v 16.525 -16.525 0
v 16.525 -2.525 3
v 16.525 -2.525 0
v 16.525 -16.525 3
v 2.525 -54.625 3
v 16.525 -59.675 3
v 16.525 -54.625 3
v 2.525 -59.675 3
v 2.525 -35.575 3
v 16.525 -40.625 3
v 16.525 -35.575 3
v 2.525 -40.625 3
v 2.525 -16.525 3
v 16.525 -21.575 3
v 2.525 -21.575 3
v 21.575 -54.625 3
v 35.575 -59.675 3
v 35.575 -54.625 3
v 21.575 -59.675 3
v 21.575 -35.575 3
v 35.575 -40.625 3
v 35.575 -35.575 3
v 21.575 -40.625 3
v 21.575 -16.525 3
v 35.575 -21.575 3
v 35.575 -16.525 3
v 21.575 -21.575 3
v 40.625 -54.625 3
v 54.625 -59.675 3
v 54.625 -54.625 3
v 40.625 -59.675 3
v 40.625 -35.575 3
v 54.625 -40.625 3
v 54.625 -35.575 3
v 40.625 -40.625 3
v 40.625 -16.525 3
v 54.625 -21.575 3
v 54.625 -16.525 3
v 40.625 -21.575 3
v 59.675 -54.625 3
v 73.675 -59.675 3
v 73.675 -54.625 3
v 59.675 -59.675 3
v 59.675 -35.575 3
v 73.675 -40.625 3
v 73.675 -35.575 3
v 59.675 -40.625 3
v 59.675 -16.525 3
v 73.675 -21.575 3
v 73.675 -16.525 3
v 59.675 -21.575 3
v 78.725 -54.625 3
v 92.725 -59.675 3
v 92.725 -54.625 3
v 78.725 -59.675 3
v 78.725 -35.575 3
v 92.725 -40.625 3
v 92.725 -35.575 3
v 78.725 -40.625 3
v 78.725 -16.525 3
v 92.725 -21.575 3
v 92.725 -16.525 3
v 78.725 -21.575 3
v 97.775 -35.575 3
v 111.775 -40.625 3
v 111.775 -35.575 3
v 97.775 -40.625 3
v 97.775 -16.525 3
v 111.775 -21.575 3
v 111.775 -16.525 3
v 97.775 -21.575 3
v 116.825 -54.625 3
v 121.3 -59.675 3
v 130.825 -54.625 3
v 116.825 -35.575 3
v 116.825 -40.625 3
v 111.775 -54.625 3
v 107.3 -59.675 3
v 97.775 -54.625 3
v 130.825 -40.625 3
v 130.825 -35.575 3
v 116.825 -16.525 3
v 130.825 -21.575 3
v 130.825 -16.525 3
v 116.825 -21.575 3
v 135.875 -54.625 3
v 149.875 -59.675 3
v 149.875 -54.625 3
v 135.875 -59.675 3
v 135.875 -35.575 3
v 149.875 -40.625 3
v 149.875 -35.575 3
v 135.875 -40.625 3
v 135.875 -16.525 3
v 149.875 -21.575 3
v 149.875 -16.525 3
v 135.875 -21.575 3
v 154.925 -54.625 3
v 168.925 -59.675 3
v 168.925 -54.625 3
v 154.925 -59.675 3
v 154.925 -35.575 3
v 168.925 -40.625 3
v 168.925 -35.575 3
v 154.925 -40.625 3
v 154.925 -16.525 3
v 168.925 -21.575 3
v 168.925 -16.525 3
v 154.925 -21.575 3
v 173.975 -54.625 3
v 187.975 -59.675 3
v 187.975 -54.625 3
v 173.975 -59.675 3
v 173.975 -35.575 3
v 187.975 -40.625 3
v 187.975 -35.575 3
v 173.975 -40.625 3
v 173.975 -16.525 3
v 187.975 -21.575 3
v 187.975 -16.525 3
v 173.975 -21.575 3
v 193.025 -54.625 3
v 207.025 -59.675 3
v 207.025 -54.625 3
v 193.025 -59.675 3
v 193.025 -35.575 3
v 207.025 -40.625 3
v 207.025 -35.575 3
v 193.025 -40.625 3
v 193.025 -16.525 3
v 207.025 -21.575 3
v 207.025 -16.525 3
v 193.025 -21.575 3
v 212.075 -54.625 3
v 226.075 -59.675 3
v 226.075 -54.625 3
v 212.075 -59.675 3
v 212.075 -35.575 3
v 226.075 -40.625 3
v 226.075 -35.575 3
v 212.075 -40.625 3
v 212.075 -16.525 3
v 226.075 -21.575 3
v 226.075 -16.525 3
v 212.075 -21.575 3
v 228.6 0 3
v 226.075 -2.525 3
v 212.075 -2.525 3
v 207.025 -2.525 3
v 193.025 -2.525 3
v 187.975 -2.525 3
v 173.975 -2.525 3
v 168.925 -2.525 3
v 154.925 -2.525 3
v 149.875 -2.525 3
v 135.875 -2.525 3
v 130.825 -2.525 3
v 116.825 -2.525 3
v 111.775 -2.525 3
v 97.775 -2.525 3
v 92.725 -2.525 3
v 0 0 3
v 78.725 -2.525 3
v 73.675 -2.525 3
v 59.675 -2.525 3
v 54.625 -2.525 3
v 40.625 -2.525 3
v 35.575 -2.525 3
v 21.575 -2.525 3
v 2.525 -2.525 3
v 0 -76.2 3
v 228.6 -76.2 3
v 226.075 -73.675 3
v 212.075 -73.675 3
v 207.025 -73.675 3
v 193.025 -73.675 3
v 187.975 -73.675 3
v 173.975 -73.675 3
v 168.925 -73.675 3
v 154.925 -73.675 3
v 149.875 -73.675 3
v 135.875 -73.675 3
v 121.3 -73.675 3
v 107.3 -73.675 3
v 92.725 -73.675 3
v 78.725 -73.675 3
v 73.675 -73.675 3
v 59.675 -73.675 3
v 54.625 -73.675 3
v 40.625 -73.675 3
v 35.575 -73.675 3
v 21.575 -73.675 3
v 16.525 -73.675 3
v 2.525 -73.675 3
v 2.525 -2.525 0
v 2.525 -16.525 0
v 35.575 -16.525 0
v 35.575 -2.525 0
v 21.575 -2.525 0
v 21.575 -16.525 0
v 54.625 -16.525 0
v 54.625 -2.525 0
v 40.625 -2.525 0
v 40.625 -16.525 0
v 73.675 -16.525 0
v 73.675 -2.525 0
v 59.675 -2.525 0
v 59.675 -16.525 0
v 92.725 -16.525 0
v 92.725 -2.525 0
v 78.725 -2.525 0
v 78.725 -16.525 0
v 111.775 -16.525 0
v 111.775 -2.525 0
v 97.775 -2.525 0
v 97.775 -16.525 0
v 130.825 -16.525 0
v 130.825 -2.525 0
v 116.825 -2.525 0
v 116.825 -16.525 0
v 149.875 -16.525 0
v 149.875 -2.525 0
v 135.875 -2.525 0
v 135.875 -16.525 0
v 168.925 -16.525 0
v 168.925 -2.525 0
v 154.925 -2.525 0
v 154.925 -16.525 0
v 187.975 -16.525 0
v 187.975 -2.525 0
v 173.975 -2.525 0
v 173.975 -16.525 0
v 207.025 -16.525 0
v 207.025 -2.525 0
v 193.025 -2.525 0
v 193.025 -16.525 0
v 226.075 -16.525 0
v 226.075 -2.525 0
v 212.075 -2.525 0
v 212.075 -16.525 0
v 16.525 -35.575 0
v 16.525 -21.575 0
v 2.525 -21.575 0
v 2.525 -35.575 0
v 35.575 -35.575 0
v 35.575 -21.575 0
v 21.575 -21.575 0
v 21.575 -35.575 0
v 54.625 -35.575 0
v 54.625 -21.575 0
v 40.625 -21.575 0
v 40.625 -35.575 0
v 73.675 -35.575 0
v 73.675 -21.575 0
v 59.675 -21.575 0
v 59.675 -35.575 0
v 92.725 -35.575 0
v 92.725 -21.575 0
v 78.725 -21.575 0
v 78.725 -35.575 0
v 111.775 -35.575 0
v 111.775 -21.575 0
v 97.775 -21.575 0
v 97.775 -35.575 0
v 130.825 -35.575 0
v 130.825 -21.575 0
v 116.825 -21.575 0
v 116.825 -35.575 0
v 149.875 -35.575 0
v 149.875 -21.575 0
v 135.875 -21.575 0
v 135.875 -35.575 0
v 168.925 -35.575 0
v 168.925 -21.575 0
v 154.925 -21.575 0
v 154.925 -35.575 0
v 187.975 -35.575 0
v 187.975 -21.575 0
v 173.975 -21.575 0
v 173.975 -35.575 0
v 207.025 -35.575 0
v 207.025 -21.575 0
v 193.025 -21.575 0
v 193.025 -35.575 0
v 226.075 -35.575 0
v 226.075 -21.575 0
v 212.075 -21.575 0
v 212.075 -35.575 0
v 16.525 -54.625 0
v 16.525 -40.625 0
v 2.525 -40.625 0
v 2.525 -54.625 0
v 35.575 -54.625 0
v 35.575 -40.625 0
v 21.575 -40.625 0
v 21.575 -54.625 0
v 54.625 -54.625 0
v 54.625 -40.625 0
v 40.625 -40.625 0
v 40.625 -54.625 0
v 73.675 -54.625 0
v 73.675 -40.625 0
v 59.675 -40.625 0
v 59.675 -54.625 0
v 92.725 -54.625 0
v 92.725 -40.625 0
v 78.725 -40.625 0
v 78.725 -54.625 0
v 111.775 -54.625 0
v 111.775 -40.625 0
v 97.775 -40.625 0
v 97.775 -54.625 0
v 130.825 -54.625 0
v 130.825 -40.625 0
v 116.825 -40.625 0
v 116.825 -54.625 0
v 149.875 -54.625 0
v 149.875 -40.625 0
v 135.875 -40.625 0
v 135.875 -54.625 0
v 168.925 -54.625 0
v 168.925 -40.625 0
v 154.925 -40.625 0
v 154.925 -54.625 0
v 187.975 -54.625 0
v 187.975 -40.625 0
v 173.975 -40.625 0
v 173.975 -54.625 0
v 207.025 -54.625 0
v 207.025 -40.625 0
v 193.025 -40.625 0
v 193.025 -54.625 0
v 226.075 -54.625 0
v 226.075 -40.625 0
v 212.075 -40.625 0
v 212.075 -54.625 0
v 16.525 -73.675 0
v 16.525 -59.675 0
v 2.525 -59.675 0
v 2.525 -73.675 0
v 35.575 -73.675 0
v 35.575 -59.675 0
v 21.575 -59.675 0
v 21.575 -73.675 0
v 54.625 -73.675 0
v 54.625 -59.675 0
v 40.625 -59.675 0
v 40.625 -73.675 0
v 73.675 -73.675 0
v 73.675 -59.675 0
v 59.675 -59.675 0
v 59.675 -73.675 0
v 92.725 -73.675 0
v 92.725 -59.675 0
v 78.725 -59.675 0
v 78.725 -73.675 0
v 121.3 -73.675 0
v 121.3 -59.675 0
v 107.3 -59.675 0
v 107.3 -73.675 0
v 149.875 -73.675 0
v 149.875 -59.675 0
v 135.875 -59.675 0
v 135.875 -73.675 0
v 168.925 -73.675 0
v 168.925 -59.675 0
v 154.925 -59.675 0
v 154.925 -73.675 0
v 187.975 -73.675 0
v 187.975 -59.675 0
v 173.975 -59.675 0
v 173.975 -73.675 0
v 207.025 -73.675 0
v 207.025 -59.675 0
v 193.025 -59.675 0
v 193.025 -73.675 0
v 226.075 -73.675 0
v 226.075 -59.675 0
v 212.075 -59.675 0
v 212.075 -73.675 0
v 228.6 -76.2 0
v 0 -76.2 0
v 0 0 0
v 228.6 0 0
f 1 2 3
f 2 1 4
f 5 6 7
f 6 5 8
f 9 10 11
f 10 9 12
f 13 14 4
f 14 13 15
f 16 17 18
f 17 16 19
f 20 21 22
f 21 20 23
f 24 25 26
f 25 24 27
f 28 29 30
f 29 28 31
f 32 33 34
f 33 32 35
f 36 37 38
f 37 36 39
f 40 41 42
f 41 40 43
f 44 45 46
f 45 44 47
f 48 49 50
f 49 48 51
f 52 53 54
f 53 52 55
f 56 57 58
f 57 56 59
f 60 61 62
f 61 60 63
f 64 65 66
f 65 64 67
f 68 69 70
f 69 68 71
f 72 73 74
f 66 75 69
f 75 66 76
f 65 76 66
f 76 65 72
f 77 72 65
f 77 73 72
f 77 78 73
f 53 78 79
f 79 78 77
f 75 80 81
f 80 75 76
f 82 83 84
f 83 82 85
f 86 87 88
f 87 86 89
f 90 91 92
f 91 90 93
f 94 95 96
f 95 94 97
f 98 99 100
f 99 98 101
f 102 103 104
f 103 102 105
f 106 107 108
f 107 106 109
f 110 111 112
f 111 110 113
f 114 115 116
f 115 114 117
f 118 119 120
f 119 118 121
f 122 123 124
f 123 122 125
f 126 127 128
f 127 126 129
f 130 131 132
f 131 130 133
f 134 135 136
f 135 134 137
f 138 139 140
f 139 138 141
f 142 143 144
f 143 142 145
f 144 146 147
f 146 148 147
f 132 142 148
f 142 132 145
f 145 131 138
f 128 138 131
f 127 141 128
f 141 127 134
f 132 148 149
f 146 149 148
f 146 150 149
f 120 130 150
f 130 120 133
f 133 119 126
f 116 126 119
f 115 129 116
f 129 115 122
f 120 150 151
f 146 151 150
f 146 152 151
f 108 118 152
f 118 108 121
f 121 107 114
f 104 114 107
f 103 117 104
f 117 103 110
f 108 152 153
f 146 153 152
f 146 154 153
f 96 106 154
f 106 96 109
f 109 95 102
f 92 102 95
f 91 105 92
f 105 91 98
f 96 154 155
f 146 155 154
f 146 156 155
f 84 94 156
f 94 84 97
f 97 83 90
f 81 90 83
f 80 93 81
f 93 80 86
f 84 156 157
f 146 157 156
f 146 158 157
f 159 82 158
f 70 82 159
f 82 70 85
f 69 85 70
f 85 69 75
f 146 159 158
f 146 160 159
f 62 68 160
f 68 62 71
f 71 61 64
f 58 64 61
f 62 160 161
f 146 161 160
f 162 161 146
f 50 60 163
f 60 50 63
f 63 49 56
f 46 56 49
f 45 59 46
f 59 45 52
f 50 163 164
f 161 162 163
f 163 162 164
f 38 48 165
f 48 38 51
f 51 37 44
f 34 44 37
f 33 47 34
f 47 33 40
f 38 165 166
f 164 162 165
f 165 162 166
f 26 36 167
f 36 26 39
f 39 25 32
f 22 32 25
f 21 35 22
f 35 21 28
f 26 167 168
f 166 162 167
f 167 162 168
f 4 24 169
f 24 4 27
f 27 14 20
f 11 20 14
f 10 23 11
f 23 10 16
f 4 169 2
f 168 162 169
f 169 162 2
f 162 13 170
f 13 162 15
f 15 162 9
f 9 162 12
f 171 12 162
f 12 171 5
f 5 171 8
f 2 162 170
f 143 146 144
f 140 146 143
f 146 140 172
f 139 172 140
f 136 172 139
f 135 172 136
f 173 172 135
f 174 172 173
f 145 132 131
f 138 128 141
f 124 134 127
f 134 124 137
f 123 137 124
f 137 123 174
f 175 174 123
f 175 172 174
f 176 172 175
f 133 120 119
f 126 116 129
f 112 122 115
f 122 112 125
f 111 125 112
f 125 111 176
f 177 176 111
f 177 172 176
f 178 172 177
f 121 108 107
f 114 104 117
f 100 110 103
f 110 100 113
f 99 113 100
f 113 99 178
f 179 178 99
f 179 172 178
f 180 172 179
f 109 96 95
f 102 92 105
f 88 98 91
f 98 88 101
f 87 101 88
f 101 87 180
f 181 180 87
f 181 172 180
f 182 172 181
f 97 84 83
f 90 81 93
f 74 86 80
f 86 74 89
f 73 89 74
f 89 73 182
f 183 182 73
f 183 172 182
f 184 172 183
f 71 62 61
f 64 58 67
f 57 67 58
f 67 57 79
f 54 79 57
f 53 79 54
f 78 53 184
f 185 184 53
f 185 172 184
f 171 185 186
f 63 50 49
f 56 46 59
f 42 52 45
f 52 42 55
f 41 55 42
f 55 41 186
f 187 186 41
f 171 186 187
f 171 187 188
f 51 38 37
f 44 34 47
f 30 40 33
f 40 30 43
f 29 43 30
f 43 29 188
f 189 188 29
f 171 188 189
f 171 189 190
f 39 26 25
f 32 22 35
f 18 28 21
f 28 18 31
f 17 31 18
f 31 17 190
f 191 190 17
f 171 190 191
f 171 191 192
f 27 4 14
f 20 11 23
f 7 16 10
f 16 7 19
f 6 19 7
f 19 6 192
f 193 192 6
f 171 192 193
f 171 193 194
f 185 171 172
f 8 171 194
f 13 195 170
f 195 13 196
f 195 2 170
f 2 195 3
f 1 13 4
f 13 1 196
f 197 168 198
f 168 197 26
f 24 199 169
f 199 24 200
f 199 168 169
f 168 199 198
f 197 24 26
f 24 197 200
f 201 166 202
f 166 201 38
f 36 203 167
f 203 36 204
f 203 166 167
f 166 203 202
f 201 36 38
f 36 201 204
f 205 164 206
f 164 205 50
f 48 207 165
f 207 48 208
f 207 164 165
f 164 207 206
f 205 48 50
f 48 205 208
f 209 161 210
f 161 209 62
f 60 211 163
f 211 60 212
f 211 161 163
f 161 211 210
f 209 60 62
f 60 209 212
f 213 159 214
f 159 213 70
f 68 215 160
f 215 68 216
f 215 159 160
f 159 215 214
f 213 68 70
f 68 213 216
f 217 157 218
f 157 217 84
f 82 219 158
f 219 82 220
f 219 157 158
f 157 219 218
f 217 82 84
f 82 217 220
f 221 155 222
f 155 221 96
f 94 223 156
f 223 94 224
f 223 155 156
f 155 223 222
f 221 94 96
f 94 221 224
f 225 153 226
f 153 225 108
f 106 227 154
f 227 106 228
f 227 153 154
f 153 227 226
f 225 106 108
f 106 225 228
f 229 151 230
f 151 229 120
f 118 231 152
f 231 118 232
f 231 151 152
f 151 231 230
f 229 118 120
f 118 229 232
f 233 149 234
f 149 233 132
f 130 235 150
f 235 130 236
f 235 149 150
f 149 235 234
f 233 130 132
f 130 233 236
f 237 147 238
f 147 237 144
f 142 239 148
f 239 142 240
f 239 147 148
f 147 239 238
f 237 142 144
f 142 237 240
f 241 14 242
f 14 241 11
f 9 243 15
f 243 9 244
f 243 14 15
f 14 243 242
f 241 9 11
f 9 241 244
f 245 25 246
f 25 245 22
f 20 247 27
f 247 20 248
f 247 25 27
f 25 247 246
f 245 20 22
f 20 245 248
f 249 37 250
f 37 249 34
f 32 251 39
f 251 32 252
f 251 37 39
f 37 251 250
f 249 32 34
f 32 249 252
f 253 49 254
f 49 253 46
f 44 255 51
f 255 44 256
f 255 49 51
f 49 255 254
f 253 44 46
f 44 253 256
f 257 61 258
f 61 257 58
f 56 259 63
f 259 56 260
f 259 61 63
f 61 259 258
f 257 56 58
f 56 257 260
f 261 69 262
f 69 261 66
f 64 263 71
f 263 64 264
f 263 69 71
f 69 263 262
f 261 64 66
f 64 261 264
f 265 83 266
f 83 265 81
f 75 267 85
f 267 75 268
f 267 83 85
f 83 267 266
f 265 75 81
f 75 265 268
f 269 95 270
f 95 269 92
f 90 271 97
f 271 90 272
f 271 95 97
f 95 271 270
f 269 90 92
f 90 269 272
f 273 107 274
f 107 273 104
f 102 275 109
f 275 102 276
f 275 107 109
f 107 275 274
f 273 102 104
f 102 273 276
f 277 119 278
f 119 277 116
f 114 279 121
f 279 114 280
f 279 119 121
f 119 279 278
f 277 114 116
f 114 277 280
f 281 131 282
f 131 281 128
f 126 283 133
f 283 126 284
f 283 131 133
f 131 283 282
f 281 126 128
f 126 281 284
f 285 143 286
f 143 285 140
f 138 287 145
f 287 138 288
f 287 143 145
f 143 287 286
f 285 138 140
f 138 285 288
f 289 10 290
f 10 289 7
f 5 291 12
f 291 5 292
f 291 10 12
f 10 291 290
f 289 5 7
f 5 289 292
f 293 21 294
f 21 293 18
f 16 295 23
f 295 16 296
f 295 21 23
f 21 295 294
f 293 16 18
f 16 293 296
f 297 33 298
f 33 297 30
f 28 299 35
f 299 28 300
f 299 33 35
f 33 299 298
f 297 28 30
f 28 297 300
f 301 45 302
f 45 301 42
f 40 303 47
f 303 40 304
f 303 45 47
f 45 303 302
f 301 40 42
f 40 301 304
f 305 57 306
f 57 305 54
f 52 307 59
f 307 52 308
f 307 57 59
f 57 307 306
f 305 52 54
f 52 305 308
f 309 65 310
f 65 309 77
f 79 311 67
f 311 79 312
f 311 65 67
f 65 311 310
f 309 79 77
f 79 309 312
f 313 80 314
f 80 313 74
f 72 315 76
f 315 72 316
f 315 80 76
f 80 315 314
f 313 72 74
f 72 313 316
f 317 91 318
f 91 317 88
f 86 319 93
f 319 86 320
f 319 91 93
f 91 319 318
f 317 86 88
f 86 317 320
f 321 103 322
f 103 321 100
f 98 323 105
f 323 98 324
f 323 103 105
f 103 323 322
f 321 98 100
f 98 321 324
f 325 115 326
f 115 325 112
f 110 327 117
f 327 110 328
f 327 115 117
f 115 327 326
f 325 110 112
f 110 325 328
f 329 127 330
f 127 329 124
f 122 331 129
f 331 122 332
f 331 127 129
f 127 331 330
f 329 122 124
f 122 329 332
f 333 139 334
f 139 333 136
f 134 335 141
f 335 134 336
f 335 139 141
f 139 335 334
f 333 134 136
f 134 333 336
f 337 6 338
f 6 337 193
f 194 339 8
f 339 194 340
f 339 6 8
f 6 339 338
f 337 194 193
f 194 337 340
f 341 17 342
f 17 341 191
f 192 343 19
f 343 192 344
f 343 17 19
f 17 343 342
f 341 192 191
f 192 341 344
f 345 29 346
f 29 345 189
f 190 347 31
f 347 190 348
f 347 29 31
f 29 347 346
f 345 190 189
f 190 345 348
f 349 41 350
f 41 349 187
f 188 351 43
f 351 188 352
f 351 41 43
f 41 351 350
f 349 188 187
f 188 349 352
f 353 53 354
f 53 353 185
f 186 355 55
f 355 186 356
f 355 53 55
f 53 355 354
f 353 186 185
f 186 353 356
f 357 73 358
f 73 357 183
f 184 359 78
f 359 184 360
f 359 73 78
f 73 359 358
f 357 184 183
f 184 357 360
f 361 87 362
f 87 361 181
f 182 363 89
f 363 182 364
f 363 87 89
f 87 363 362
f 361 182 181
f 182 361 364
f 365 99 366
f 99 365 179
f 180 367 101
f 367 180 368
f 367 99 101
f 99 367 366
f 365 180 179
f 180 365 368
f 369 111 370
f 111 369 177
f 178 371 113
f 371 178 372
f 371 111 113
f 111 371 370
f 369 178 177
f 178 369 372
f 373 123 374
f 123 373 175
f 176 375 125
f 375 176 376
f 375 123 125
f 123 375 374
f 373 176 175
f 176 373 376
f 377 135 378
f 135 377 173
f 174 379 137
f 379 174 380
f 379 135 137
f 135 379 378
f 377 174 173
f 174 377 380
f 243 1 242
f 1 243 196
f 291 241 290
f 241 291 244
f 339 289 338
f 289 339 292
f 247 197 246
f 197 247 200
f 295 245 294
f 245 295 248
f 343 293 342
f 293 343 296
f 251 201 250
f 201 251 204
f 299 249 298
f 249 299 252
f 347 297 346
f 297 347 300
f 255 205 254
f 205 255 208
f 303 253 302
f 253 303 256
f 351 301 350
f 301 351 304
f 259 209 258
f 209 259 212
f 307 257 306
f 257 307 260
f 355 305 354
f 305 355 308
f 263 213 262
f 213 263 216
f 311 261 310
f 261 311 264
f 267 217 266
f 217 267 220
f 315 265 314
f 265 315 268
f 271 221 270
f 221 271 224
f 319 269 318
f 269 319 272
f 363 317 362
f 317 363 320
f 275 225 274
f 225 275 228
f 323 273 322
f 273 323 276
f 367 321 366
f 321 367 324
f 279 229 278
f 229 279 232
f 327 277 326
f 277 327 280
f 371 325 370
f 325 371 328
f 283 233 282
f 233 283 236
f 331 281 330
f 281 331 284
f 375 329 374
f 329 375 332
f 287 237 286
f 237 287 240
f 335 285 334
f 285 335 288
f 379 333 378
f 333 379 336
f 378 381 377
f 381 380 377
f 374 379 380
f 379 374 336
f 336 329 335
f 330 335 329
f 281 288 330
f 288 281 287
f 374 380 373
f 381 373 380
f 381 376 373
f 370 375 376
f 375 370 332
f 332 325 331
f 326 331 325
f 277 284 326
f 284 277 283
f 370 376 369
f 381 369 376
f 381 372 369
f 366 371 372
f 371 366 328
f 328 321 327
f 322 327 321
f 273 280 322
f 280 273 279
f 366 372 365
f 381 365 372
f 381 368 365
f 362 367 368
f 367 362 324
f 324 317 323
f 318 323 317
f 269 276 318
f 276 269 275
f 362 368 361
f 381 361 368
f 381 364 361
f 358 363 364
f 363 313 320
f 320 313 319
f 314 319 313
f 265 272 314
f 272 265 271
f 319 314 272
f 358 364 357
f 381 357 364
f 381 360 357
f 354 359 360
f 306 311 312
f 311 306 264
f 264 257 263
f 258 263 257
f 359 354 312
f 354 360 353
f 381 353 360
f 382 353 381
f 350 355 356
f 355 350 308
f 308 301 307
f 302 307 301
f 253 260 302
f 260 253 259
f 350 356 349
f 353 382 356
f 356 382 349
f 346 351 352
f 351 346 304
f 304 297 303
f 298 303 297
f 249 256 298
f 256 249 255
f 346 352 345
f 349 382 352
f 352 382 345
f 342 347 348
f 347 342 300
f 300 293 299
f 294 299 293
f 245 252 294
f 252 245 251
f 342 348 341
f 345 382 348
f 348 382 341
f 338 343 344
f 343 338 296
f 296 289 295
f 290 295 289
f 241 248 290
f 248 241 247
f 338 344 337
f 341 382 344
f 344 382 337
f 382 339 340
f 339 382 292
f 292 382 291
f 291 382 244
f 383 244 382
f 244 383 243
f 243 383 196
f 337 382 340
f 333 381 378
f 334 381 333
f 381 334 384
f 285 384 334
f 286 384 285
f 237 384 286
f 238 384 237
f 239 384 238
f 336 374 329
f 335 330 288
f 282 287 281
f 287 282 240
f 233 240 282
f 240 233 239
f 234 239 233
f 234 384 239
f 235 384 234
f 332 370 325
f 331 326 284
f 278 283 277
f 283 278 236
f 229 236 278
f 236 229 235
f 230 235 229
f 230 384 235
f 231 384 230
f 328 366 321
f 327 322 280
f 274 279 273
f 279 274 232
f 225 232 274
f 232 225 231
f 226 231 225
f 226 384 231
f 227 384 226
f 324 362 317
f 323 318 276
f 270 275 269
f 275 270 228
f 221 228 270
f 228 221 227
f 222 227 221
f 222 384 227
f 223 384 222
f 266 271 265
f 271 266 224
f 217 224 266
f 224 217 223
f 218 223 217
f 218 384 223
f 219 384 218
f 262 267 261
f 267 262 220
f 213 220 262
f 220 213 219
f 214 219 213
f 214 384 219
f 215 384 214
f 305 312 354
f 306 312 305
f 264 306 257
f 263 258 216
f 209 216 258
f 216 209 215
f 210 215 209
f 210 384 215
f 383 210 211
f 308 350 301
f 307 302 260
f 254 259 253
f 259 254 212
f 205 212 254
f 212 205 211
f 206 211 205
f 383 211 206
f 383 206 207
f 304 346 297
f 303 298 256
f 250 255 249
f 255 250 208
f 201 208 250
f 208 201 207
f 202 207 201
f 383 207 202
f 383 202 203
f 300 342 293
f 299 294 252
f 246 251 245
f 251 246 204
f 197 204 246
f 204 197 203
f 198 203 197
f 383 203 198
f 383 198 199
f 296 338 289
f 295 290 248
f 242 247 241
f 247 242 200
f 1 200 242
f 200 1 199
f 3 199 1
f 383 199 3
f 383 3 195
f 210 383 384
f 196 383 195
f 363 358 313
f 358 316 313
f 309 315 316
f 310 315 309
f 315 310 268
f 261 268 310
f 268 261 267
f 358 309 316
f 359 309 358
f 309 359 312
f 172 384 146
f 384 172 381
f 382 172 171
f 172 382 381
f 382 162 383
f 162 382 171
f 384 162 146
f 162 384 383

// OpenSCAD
$fn = $preview ? 0 : 100;


difference(){
	difference() {
		union() {
			linear_extrude(height = 3) {
				polygon(points = [[0.0, -76.2], [228.60000000000002, -76.2], [228.60000000000002, 0.0], [0.0, 0.0], [0.0, -76.2]]);
			}
		}
	}
	/* Holes Below*/
	union(){
		translate(v = [9.5250000000, -9.5250000000, 0]) {
			cube(center = true, size = [14, 14, 6]);
		}
		translate(v = [28.5750000000, -9.5250000000, 0]) {
			cube(center = true, size = [14, 14, 6]);
		}
		translate(v = [47.6250000000, -9.5250000000, 0]) {
			cube(center = true, size = [14, 14, 6]);
		}
		translate(v = [66.6750000000, -9.5250000000, 0]) {
			cube(center = true, size = [14, 14, 6]);
		}
		translate(v = [85.7250000000, -9.5250000000, 0]) {
			cube(center = true, size = [14, 14, 6]);
		}
		translate(v = [104.7750000000, -9.5250000000, 0]) {
			cube(center = true, size = [14, 14, 6]);
		}
		translate(v = [123.8250000000, -9.5250000000, 0]) {
			cube(center = true, size = [14, 14, 6]);
		}
		translate(v = [142.8750000000, -9.5250000000, 0]) {
			cube(center = true, size = [14, 14, 6]);
		}
		translate(v = [161.9250000000, -9.5250000000, 0]) {
			cube(center = true, size = [14, 14, 6]);
		}
		translate(v = [180.9750000000, -9.5250000000, 0]) {
			cube(center = true, size = [14, 14, 6]);
		}
		translate(v = [200.0250000000, -9.5250000000, 0]) {
			cube(center = true, size = [14, 14, 6]);
		}
		translate(v = [219.0750000000, -9.5250000000, 0]) {
			cube(center = true, size = [14, 14, 6]);
		}
		translate(v = [9.5250000000, -28.5750000000, 0]) {
			cube(center = true, size = [14, 14, 6]);
		}
		translate(v = [28.5750000000, -28.5750000000, 0]) {
			cube(center = true, size = [14, 14, 6]);
		}
		translate(v = [47.6250000000, -28.5750000000, 0]) {
			cube(center = true, size = [14, 14, 6]);
		}
		translate(v = [66.6750000000, -28.5750000000, 0]) {
			cube(center = true, size = [14, 14, 6]);
		}
		translate(v = [85.7250000000, -28.5750000000, 0]) {
			cube(center = true, size = [14, 14, 6]);
		}
		translate(v = [104.7750000000, -28.5750000000, 0]) {
			cube(center = true, size = [14, 14, 6]);
		}
		translate(v = [123.8250000000, -28.5750000000, 0]) {
			cube(center = true, size = [14, 14, 6]);
		}
		translate(v = [142.8750000000, -28.5750000000, 0]) {
			cube(center = true, size = [14, 14, 6]);
		}
		translate(v = [161.9250000000, -28.5750000000, 0]) {
			cube(center = true, size = [14, 14, 6]);
		}
		translate(v = [180.9750000000, -28.5750000000, 0]) {
			cube(center = true, size = [14, 14, 6]);
		}
		translate(v = [200.0250000000, -28.5750000000, 0]) {
			cube(center = true, size = [14, 14, 6]);
		}
		translate(v = [219.0750000000, -28.5750000000, 0]) {
			cube(center = true, size = [14, 14, 6]);
		}
		translate(v = [9.5250000000, -47.6250000000, 0]) {
			cube(center = true, size = [14, 14, 6]);
		}
		translate(v = [28.5750000000, -47.6250000000, 0]) {
			cube(center = true, size = [14, 14, 6]);
		}
		translate(v = [47.6250000000, -47.6250000000, 0]) {
			cube(center = true, size = [14, 14, 6]);
		}
		translate(v = [66.6750000000, -47.6250000000, 0]) {
			cube(center = true, size = [14, 14, 6]);
		}
		translate(v = [85.7250000000, -47.6250000000, 0]) {
			cube(center = true, size = [14, 14, 6]);
		}
		translate(v = [104.7750000000, -47.6250000000, 0]) {
			cube(center = true, size = [14, 14, 6]);
		}
		translate(v = [123.8250000000, -47.6250000000, 0]) {
			cube(center = true, size = [14, 14, 6]);
		}
		translate(v = [142.8750000000, -47.6250000000, 0]) {
			cube(center = true, size = [14, 14, 6]);
		}
		translate(v = [161.9250000000, -47.6250000000, 0]) {
			cube(center = true, size = [14, 14, 6]);
		}
		translate(v = [180.9750000000, -47.6250000000, 0]) {
			cube(center = true, size = [14, 14, 6]);
		}
		translate(v = [200.0250000000, -47.6250000000, 0]) {
			cube(center = true, size = [14, 14, 6]);
		}
		translate(v = [219.0750000000, -47.6250000000, 0]) {
			cube(center = true, size = [14, 14, 6]);
		}
		translate(v = [9.5250000000, -66.6750000000, 0]) {
			cube(center = true, size = [14, 14, 6]);
		}
		translate(v = [28.5750000000, -66.6750000000, 0]) {
			cube(center = true, size = [14, 14, 6]);
		}
		translate(v = [47.6250000000, -66.6750000000, 0]) {
			cube(center = true, size = [14, 14, 6]);
		}
		translate(v = [66.6750000000, -66.6750000000, 0]) {
			cube(center = true, size = [14, 14, 6]);
		}
		translate(v = [85.7250000000, -66.6750000000, 0]) {
			cube(center = true, size = [14, 14, 6]);
		}
		translate(v = [114.3000000000, -66.6750000000, 0]) {
			cube(center = true, size = [14, 14, 6]);
		}
		translate(v = [142.8750000000, -66.6750000000, 0]) {
			cube(center = true, size = [14, 14, 6]);
		}
		translate(v = [161.9250000000, -66.6750000000, 0]) {
			cube(center = true, size = [14, 14, 6]);
		}
		translate(v = [180.9750000000, -66.6750000000, 0]) {
			cube(center = true, size = [14, 14, 6]);
		}
		translate(v = [200.0250000000, -66.6750000000, 0]) {
			cube(center = true, size = [14, 14, 6]);
		}
		translate(v = [219.0750000000, -66.6750000000, 0]) {
			cube(center = true, size = [14, 14, 6]);
		}
	} /* End Holes */ 
}
